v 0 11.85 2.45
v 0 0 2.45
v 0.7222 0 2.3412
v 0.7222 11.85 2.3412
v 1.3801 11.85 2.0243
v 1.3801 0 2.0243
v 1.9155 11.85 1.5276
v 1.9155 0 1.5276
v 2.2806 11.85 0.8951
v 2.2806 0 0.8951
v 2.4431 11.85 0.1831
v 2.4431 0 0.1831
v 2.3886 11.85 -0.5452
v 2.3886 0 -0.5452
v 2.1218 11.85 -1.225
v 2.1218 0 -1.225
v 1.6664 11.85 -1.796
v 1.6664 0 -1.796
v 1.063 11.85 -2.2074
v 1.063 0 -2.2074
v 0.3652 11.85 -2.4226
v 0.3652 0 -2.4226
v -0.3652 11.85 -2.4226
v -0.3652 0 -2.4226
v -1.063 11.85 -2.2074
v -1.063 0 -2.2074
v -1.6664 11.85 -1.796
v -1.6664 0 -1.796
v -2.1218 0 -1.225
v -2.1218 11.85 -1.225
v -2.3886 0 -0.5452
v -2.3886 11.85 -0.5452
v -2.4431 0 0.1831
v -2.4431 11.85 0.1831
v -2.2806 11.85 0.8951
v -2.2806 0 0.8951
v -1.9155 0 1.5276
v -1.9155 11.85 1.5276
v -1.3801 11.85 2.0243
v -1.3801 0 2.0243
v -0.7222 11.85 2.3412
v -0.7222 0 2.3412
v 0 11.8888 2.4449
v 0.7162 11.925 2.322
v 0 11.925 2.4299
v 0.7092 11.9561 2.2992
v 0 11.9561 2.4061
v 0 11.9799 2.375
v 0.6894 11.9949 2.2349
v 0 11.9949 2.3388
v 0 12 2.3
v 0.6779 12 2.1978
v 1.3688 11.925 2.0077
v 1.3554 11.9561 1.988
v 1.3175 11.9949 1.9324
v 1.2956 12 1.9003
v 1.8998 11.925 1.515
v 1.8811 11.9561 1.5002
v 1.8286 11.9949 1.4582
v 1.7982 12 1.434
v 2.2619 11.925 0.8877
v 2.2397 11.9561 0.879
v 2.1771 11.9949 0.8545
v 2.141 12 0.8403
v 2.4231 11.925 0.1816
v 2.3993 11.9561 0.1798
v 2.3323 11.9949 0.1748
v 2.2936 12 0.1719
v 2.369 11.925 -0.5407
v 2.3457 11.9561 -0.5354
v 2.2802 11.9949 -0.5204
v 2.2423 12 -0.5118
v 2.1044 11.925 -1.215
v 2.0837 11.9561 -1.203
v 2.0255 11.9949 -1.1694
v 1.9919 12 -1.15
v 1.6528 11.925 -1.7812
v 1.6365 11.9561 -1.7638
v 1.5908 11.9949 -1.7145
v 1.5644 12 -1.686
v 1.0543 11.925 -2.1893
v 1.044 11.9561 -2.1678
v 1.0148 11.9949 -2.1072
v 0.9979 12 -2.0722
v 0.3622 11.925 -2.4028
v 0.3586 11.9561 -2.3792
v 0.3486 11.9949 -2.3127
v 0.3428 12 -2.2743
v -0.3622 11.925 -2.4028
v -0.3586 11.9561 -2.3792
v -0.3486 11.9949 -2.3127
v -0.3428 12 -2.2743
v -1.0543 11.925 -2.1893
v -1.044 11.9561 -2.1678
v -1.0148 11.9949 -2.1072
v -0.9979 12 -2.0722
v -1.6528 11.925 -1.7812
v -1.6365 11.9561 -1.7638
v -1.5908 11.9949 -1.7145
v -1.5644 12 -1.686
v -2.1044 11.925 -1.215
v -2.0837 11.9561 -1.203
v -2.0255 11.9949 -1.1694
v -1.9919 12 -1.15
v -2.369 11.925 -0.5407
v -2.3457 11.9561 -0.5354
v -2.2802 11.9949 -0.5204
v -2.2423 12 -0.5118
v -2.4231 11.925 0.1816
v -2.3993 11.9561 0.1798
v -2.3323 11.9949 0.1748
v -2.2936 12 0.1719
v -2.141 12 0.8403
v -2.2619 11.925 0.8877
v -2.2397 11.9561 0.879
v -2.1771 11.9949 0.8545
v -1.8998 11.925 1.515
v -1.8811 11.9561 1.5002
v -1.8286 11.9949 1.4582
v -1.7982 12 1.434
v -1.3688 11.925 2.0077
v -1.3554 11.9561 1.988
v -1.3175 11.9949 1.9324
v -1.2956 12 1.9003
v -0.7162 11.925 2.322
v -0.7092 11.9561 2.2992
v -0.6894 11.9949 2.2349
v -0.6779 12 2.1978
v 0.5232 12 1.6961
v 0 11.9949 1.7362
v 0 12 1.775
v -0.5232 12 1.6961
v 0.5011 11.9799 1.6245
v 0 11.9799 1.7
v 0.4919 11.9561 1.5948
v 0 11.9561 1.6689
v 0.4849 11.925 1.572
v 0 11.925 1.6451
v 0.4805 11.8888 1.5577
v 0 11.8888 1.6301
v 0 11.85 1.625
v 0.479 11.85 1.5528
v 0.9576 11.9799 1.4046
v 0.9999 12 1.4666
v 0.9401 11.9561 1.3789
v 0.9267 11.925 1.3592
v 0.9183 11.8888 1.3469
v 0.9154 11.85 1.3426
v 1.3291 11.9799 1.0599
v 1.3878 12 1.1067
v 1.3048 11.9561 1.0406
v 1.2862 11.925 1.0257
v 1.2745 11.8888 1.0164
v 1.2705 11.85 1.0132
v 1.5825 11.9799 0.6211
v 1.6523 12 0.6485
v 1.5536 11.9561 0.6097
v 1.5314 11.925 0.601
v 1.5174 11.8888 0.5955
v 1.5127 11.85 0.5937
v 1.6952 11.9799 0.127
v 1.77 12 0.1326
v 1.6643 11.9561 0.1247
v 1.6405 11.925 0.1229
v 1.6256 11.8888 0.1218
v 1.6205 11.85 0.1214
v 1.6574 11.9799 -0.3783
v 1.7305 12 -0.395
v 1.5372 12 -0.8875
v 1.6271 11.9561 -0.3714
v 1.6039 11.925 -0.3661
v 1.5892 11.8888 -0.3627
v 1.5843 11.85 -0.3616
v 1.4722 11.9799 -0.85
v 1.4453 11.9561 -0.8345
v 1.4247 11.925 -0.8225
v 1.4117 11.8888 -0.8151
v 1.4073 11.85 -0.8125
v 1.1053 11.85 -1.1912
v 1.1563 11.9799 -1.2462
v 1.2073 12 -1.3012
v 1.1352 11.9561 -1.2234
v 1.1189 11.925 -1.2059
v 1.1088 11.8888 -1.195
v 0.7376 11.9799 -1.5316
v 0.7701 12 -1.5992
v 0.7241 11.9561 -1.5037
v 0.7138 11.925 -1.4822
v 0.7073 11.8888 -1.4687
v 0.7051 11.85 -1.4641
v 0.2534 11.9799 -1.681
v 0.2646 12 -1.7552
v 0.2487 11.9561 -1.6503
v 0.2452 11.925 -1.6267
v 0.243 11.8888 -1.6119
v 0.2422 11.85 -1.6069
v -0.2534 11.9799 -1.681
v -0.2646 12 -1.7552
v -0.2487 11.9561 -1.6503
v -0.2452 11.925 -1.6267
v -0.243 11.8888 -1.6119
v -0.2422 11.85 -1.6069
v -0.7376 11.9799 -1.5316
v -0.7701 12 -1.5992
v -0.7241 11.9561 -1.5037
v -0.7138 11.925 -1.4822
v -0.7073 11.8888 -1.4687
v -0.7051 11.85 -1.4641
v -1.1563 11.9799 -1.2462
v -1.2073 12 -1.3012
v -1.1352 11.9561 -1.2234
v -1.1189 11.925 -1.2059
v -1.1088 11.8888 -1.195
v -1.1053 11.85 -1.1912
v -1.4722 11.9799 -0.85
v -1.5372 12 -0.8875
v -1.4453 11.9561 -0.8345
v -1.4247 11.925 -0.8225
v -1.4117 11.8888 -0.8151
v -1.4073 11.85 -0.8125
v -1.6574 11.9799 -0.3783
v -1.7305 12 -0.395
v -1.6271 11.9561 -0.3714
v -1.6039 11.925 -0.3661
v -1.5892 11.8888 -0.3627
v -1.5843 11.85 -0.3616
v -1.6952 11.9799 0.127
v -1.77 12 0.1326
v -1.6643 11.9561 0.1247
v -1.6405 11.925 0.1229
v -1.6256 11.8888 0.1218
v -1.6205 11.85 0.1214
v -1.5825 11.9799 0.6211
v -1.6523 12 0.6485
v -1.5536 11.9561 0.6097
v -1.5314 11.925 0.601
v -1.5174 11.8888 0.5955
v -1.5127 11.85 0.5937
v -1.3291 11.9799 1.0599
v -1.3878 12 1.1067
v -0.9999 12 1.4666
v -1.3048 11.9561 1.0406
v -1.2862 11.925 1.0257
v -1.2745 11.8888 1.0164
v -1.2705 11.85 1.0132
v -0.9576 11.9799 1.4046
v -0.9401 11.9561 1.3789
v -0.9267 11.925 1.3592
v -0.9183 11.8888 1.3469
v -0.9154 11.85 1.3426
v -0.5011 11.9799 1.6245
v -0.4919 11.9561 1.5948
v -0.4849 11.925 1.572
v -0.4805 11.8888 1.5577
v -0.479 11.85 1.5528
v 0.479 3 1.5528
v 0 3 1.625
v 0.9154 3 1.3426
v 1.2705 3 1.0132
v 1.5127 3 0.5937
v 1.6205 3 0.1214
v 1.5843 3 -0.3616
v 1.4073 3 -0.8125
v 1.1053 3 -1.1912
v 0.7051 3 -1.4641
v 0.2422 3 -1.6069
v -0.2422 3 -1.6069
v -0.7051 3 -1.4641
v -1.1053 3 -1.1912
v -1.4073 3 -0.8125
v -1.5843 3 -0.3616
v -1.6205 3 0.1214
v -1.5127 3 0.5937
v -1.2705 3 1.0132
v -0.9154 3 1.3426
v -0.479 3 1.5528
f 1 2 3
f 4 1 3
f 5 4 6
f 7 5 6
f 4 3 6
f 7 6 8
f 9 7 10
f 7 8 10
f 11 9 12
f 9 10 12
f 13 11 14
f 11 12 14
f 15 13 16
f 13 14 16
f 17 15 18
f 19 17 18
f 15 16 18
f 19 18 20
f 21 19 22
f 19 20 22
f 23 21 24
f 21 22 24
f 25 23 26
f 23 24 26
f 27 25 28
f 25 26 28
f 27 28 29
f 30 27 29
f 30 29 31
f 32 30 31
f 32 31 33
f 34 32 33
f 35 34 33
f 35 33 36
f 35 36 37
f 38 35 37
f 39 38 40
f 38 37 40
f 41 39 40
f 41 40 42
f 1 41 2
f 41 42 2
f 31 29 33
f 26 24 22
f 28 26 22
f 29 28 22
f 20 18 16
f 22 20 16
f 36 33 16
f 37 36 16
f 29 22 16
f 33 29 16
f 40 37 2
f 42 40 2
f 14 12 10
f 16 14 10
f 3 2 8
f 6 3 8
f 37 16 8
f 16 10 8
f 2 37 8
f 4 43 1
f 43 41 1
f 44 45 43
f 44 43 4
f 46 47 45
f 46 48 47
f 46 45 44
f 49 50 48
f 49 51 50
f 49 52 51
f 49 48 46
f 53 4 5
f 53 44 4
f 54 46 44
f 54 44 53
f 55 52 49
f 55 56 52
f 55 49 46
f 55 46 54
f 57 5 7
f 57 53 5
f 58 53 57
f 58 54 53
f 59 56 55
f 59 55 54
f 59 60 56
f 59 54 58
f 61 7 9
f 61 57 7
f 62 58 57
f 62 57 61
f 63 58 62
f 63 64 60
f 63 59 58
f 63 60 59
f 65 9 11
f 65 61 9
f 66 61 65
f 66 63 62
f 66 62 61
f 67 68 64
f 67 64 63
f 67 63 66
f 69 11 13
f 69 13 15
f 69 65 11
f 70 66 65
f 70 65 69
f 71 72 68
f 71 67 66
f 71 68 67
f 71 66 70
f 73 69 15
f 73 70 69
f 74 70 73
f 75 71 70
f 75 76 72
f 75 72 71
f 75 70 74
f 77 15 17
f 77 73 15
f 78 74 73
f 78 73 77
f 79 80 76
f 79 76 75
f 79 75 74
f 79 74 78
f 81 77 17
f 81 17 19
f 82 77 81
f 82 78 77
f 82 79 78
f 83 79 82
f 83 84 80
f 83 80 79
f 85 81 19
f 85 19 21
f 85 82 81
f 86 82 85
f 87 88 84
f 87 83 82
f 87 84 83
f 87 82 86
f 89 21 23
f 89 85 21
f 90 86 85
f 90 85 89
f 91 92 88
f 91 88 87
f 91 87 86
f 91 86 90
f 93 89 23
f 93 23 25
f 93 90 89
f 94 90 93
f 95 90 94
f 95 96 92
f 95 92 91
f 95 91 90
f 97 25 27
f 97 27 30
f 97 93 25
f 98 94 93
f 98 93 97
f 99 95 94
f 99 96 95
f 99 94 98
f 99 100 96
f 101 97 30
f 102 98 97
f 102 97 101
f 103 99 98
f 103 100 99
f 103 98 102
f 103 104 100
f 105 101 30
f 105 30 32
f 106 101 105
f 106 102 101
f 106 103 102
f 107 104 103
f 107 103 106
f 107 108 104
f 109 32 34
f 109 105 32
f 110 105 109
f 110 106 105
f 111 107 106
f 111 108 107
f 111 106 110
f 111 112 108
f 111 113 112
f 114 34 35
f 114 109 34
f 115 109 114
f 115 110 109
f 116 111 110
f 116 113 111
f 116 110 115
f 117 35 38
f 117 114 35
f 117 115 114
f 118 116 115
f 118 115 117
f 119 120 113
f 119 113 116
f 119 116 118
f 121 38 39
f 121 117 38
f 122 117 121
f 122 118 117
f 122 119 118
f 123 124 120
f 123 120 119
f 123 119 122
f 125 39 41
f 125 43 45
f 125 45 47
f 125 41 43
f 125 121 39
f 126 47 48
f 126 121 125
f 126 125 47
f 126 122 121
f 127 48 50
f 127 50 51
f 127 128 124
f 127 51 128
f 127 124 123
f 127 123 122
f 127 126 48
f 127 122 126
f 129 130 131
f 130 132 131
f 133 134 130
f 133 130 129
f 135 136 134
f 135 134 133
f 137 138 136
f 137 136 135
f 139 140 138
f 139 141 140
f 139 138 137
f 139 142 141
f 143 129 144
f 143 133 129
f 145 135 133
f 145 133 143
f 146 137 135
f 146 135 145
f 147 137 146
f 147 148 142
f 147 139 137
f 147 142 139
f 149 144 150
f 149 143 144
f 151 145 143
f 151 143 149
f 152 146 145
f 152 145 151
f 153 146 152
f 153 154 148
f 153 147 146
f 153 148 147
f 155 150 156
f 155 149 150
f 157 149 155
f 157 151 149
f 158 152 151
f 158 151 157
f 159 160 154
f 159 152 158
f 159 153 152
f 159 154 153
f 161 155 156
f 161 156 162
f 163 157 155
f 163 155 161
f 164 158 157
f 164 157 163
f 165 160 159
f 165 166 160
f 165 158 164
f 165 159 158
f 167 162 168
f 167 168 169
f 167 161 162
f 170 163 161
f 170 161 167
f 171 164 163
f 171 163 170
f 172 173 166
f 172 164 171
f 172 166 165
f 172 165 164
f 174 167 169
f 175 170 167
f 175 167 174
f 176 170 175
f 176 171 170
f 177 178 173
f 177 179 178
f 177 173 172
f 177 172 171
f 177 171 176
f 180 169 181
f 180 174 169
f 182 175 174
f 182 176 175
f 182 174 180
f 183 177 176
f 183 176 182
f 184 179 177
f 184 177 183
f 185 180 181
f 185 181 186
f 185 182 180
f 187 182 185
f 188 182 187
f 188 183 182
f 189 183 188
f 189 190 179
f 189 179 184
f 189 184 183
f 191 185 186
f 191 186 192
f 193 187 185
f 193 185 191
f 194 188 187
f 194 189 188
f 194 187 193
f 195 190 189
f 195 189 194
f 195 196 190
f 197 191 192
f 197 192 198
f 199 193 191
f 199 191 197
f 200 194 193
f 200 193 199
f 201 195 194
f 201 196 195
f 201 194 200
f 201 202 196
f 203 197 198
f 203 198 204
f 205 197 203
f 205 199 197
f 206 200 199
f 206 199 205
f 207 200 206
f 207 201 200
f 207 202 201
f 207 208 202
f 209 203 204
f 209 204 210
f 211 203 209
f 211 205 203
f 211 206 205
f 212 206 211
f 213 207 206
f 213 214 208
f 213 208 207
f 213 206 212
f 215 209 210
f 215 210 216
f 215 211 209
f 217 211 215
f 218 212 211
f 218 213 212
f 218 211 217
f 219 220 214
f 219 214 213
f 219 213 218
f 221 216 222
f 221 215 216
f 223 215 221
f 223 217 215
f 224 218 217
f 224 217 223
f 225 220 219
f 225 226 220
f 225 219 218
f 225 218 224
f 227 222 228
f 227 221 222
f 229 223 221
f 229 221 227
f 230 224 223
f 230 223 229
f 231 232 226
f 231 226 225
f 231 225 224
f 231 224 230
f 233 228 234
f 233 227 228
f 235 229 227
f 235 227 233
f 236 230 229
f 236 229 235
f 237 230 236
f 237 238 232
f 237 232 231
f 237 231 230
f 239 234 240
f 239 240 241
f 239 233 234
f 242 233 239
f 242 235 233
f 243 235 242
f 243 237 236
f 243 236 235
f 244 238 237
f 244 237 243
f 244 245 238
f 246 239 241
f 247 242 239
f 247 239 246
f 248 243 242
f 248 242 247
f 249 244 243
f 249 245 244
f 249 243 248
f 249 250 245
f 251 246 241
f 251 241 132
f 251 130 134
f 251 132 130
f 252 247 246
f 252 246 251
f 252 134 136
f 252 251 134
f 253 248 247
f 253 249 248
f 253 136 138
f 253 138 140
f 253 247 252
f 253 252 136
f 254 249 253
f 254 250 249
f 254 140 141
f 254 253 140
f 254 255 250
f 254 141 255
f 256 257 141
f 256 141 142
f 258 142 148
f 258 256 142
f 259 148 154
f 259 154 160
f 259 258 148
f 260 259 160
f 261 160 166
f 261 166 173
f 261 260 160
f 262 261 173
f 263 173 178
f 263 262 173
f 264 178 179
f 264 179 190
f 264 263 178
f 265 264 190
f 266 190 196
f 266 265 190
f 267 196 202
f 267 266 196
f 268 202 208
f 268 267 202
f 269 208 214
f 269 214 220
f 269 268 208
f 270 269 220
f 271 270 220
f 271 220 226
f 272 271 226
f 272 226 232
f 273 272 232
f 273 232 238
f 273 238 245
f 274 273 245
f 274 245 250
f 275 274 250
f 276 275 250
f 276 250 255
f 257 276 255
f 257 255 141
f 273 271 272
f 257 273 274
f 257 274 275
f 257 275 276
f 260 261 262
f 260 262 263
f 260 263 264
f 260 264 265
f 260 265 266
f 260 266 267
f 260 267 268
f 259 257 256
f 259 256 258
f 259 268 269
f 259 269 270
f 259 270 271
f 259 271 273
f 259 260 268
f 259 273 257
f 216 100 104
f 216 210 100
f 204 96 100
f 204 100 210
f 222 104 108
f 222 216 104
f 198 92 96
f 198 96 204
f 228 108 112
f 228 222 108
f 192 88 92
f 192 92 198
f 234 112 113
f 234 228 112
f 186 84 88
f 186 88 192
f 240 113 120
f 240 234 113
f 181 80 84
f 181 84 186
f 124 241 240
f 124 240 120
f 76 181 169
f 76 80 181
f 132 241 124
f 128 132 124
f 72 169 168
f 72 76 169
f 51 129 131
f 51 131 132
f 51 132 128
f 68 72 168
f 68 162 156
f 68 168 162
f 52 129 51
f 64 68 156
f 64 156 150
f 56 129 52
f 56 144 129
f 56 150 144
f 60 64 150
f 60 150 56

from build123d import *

# Parameters (mm, degrees)
SKETCH1_R           = 2.45
SKETCH1_R_2         = 1.625
BOSS_EXTRUDE1_DEPTH = 12
SKETCH1_4_R         = 1.625
BOSS_EXTRUDE2_DEPTH = 3
FILLET1_R           = 0.15


with BuildPart() as part:
    # Sketch1 → Boss-Extrude1 (new body)
    with BuildSketch(Plane(origin=(0, 0, 0), x_dir=(1, 0, 0), z_dir=(0, 1, 0))):
        with Locations(Location((0, 0, 0), (0, 0, 270))):
            Circle(SKETCH1_R)
        with Locations(Location((0, 0, 0), (0, 0, 270))):
            Circle(SKETCH1_R_2, mode=Mode.SUBTRACT)
    extrude(amount=BOSS_EXTRUDE1_DEPTH)

    # Sketch1<4> → Boss-Extrude2 (add)
    with BuildSketch(Plane(origin=(0, 0, 0), x_dir=(1, 0, 0), z_dir=(0, 1, 0))):
        with Locations(Location((0, 0, 0), (0, 0, 270))):
            Circle(SKETCH1_4_R)
    extrude(amount=BOSS_EXTRUDE2_DEPTH)

    # Fillet1
    fillet1_edges = [part.edges().sort_by_distance(p)[0] for p in [
        (0, 12, -2.45),
        (0, 12, -1.625),
    ]]
    fillet(fillet1_edges, radius=FILLET1_R)


solid = part.part
